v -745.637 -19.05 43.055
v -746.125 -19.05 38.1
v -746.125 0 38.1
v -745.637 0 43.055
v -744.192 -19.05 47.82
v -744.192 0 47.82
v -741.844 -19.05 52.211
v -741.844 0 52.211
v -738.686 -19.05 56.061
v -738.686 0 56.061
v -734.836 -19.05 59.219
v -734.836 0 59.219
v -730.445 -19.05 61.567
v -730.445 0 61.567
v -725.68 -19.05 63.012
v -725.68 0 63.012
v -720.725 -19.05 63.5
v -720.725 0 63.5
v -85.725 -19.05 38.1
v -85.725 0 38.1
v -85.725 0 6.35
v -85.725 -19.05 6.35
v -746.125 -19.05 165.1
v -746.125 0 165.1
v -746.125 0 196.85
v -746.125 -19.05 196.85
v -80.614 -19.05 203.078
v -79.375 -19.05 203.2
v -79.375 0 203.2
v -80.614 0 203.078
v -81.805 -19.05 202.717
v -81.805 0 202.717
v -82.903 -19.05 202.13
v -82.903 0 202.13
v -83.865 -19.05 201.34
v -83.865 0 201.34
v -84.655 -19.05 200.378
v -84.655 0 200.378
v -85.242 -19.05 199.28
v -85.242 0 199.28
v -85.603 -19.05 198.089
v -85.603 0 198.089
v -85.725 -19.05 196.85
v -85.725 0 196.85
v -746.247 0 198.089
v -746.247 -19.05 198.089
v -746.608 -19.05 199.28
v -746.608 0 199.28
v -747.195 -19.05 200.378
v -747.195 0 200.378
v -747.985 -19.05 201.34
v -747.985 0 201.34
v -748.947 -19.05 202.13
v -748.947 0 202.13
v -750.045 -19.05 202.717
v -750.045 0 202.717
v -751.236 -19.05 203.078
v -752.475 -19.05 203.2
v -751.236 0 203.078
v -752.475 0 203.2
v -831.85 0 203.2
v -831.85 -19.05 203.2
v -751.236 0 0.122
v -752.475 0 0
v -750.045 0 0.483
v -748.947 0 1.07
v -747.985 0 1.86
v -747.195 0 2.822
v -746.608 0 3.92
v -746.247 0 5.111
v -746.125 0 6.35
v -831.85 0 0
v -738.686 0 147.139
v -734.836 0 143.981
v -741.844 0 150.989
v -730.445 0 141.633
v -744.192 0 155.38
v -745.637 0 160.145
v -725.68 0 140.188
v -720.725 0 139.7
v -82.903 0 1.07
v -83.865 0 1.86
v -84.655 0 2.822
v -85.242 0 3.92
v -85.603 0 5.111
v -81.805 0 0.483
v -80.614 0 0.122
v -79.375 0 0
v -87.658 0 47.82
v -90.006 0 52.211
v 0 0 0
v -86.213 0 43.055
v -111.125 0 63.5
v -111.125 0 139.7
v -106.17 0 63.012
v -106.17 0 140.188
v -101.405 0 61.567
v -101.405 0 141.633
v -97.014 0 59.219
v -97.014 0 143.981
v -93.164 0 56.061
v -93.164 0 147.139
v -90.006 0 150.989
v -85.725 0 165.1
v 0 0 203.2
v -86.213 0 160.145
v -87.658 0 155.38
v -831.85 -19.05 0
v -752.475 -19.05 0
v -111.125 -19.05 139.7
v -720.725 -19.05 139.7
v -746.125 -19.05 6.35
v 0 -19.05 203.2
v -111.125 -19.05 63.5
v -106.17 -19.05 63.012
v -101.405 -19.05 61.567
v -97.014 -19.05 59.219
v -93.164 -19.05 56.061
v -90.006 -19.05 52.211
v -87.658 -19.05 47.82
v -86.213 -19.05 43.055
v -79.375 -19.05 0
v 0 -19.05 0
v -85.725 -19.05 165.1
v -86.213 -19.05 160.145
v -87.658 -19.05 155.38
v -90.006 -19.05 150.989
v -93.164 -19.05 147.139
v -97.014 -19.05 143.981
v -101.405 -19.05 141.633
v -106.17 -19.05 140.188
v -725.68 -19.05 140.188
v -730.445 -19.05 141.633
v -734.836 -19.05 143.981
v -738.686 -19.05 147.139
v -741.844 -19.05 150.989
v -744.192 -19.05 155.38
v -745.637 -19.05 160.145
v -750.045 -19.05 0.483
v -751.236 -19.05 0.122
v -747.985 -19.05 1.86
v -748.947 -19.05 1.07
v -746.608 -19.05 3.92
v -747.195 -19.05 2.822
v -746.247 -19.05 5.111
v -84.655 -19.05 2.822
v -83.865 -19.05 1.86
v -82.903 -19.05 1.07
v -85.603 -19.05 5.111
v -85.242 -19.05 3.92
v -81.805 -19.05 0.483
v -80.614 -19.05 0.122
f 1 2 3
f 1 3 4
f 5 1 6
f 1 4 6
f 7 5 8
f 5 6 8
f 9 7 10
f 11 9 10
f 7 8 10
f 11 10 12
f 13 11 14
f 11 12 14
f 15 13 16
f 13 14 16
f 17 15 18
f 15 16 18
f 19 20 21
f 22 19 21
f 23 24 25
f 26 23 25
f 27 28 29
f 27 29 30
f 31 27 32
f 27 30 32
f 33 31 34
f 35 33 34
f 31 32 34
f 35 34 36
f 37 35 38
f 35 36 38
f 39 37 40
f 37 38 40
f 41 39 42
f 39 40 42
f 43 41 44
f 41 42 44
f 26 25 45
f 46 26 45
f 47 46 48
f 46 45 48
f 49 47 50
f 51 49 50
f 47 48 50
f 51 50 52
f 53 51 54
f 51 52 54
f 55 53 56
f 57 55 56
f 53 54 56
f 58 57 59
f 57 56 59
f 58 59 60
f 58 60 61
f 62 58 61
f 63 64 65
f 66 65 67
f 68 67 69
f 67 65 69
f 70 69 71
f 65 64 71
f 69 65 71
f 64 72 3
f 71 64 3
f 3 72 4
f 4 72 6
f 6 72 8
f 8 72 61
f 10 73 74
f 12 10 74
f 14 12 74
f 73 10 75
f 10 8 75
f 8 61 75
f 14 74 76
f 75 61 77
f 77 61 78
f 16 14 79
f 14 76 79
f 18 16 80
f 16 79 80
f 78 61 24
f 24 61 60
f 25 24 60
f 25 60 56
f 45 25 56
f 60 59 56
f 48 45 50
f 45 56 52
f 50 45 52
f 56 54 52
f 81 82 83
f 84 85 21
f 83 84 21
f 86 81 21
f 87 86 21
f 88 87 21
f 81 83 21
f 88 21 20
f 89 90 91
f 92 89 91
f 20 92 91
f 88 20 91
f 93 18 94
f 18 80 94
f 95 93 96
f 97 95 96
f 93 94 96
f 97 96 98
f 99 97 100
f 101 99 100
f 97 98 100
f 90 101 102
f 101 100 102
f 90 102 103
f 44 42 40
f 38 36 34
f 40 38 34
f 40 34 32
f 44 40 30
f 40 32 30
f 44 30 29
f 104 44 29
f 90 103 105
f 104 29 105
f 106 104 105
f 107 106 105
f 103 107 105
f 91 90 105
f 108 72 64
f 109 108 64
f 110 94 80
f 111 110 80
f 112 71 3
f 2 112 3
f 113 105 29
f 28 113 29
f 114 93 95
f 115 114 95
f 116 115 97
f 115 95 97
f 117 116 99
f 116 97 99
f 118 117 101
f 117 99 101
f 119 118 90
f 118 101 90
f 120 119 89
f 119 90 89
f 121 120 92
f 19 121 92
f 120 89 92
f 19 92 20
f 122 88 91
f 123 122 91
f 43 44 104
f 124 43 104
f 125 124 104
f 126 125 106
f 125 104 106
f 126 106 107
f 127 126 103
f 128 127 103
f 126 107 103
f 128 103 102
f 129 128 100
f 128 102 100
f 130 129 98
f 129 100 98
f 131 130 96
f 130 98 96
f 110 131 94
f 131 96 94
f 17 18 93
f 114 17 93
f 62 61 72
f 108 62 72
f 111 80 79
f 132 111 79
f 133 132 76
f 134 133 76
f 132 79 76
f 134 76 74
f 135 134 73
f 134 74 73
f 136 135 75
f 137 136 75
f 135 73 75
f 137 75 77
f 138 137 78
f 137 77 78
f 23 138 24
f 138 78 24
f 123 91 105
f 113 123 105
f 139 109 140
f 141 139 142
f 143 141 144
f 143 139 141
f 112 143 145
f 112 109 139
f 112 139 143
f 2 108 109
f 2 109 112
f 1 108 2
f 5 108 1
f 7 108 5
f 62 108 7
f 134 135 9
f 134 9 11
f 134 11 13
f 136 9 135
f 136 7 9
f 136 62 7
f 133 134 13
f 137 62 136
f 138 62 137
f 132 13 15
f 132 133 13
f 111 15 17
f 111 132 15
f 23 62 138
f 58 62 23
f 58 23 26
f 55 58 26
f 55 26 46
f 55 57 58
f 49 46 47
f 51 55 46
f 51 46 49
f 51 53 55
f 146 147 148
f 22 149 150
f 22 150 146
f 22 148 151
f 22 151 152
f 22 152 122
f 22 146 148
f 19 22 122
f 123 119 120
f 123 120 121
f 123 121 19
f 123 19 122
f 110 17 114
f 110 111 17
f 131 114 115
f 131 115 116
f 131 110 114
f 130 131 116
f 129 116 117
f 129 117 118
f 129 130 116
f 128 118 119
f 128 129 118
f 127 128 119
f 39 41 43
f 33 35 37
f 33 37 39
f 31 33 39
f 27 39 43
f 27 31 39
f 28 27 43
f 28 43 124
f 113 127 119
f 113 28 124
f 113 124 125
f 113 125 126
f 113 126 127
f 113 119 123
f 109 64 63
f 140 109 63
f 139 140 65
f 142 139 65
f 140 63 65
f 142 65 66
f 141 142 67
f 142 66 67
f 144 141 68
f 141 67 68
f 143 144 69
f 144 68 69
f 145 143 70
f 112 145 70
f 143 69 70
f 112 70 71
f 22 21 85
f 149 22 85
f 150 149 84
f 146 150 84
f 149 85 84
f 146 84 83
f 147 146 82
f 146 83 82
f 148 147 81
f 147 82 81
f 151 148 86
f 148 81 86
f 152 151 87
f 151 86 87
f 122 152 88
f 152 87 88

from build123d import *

# Parameters (mm, degrees)
F1_DEPTH = 19.05


with BuildPart() as f1:
    # F0 (on Front) → F1 (new body)
    with BuildSketch(Plane.XZ):
        with BuildLine():
            Line((-752.475, 203.2), (-831.85, 203.2))
            Line((-831.85, 203.2), (-831.85, 0))
            Line((-831.85, 0), (-752.475, 0))
            ThreePointArc((-752.475, 0), (-747.984872, 1.859872), (-746.125, 6.35))
            Line((-746.125, 6.35), (-746.125, 38.1))
            ThreePointArc((-746.125, 38.1), (-738.685512, 56.060512), (-720.725, 63.5))
            Line((-720.725, 63.5), (-111.125, 63.5))
            ThreePointArc((-111.125, 63.5), (-93.164488, 56.060512), (-85.725, 38.1))
            Line((-85.725, 38.1), (-85.725, 6.35))
            ThreePointArc((-85.725, 6.35), (-83.865128, 1.859872), (-79.375, 0))
            Line((-79.375, 0), (0, 0))
            Line((0, 0), (0, 203.2))
            Line((0, 203.2), (-79.375, 203.2))
            ThreePointArc((-79.375, 203.2), (-83.865128, 201.340128), (-85.725, 196.85))
            Line((-85.725, 196.85), (-85.725, 165.1))
            ThreePointArc((-85.725, 165.1), (-93.164488, 147.139488), (-111.125, 139.7))
            Line((-111.125, 139.7), (-720.725, 139.7))
            ThreePointArc((-720.725, 139.7), (-738.685512, 147.139488), (-746.125, 165.1))
            Line((-746.125, 165.1), (-746.125, 196.85))
            ThreePointArc((-746.125, 196.85), (-747.984872, 201.340128), (-752.475, 203.2))
        make_face()
    extrude(amount=F1_DEPTH)


solid = f1.part
